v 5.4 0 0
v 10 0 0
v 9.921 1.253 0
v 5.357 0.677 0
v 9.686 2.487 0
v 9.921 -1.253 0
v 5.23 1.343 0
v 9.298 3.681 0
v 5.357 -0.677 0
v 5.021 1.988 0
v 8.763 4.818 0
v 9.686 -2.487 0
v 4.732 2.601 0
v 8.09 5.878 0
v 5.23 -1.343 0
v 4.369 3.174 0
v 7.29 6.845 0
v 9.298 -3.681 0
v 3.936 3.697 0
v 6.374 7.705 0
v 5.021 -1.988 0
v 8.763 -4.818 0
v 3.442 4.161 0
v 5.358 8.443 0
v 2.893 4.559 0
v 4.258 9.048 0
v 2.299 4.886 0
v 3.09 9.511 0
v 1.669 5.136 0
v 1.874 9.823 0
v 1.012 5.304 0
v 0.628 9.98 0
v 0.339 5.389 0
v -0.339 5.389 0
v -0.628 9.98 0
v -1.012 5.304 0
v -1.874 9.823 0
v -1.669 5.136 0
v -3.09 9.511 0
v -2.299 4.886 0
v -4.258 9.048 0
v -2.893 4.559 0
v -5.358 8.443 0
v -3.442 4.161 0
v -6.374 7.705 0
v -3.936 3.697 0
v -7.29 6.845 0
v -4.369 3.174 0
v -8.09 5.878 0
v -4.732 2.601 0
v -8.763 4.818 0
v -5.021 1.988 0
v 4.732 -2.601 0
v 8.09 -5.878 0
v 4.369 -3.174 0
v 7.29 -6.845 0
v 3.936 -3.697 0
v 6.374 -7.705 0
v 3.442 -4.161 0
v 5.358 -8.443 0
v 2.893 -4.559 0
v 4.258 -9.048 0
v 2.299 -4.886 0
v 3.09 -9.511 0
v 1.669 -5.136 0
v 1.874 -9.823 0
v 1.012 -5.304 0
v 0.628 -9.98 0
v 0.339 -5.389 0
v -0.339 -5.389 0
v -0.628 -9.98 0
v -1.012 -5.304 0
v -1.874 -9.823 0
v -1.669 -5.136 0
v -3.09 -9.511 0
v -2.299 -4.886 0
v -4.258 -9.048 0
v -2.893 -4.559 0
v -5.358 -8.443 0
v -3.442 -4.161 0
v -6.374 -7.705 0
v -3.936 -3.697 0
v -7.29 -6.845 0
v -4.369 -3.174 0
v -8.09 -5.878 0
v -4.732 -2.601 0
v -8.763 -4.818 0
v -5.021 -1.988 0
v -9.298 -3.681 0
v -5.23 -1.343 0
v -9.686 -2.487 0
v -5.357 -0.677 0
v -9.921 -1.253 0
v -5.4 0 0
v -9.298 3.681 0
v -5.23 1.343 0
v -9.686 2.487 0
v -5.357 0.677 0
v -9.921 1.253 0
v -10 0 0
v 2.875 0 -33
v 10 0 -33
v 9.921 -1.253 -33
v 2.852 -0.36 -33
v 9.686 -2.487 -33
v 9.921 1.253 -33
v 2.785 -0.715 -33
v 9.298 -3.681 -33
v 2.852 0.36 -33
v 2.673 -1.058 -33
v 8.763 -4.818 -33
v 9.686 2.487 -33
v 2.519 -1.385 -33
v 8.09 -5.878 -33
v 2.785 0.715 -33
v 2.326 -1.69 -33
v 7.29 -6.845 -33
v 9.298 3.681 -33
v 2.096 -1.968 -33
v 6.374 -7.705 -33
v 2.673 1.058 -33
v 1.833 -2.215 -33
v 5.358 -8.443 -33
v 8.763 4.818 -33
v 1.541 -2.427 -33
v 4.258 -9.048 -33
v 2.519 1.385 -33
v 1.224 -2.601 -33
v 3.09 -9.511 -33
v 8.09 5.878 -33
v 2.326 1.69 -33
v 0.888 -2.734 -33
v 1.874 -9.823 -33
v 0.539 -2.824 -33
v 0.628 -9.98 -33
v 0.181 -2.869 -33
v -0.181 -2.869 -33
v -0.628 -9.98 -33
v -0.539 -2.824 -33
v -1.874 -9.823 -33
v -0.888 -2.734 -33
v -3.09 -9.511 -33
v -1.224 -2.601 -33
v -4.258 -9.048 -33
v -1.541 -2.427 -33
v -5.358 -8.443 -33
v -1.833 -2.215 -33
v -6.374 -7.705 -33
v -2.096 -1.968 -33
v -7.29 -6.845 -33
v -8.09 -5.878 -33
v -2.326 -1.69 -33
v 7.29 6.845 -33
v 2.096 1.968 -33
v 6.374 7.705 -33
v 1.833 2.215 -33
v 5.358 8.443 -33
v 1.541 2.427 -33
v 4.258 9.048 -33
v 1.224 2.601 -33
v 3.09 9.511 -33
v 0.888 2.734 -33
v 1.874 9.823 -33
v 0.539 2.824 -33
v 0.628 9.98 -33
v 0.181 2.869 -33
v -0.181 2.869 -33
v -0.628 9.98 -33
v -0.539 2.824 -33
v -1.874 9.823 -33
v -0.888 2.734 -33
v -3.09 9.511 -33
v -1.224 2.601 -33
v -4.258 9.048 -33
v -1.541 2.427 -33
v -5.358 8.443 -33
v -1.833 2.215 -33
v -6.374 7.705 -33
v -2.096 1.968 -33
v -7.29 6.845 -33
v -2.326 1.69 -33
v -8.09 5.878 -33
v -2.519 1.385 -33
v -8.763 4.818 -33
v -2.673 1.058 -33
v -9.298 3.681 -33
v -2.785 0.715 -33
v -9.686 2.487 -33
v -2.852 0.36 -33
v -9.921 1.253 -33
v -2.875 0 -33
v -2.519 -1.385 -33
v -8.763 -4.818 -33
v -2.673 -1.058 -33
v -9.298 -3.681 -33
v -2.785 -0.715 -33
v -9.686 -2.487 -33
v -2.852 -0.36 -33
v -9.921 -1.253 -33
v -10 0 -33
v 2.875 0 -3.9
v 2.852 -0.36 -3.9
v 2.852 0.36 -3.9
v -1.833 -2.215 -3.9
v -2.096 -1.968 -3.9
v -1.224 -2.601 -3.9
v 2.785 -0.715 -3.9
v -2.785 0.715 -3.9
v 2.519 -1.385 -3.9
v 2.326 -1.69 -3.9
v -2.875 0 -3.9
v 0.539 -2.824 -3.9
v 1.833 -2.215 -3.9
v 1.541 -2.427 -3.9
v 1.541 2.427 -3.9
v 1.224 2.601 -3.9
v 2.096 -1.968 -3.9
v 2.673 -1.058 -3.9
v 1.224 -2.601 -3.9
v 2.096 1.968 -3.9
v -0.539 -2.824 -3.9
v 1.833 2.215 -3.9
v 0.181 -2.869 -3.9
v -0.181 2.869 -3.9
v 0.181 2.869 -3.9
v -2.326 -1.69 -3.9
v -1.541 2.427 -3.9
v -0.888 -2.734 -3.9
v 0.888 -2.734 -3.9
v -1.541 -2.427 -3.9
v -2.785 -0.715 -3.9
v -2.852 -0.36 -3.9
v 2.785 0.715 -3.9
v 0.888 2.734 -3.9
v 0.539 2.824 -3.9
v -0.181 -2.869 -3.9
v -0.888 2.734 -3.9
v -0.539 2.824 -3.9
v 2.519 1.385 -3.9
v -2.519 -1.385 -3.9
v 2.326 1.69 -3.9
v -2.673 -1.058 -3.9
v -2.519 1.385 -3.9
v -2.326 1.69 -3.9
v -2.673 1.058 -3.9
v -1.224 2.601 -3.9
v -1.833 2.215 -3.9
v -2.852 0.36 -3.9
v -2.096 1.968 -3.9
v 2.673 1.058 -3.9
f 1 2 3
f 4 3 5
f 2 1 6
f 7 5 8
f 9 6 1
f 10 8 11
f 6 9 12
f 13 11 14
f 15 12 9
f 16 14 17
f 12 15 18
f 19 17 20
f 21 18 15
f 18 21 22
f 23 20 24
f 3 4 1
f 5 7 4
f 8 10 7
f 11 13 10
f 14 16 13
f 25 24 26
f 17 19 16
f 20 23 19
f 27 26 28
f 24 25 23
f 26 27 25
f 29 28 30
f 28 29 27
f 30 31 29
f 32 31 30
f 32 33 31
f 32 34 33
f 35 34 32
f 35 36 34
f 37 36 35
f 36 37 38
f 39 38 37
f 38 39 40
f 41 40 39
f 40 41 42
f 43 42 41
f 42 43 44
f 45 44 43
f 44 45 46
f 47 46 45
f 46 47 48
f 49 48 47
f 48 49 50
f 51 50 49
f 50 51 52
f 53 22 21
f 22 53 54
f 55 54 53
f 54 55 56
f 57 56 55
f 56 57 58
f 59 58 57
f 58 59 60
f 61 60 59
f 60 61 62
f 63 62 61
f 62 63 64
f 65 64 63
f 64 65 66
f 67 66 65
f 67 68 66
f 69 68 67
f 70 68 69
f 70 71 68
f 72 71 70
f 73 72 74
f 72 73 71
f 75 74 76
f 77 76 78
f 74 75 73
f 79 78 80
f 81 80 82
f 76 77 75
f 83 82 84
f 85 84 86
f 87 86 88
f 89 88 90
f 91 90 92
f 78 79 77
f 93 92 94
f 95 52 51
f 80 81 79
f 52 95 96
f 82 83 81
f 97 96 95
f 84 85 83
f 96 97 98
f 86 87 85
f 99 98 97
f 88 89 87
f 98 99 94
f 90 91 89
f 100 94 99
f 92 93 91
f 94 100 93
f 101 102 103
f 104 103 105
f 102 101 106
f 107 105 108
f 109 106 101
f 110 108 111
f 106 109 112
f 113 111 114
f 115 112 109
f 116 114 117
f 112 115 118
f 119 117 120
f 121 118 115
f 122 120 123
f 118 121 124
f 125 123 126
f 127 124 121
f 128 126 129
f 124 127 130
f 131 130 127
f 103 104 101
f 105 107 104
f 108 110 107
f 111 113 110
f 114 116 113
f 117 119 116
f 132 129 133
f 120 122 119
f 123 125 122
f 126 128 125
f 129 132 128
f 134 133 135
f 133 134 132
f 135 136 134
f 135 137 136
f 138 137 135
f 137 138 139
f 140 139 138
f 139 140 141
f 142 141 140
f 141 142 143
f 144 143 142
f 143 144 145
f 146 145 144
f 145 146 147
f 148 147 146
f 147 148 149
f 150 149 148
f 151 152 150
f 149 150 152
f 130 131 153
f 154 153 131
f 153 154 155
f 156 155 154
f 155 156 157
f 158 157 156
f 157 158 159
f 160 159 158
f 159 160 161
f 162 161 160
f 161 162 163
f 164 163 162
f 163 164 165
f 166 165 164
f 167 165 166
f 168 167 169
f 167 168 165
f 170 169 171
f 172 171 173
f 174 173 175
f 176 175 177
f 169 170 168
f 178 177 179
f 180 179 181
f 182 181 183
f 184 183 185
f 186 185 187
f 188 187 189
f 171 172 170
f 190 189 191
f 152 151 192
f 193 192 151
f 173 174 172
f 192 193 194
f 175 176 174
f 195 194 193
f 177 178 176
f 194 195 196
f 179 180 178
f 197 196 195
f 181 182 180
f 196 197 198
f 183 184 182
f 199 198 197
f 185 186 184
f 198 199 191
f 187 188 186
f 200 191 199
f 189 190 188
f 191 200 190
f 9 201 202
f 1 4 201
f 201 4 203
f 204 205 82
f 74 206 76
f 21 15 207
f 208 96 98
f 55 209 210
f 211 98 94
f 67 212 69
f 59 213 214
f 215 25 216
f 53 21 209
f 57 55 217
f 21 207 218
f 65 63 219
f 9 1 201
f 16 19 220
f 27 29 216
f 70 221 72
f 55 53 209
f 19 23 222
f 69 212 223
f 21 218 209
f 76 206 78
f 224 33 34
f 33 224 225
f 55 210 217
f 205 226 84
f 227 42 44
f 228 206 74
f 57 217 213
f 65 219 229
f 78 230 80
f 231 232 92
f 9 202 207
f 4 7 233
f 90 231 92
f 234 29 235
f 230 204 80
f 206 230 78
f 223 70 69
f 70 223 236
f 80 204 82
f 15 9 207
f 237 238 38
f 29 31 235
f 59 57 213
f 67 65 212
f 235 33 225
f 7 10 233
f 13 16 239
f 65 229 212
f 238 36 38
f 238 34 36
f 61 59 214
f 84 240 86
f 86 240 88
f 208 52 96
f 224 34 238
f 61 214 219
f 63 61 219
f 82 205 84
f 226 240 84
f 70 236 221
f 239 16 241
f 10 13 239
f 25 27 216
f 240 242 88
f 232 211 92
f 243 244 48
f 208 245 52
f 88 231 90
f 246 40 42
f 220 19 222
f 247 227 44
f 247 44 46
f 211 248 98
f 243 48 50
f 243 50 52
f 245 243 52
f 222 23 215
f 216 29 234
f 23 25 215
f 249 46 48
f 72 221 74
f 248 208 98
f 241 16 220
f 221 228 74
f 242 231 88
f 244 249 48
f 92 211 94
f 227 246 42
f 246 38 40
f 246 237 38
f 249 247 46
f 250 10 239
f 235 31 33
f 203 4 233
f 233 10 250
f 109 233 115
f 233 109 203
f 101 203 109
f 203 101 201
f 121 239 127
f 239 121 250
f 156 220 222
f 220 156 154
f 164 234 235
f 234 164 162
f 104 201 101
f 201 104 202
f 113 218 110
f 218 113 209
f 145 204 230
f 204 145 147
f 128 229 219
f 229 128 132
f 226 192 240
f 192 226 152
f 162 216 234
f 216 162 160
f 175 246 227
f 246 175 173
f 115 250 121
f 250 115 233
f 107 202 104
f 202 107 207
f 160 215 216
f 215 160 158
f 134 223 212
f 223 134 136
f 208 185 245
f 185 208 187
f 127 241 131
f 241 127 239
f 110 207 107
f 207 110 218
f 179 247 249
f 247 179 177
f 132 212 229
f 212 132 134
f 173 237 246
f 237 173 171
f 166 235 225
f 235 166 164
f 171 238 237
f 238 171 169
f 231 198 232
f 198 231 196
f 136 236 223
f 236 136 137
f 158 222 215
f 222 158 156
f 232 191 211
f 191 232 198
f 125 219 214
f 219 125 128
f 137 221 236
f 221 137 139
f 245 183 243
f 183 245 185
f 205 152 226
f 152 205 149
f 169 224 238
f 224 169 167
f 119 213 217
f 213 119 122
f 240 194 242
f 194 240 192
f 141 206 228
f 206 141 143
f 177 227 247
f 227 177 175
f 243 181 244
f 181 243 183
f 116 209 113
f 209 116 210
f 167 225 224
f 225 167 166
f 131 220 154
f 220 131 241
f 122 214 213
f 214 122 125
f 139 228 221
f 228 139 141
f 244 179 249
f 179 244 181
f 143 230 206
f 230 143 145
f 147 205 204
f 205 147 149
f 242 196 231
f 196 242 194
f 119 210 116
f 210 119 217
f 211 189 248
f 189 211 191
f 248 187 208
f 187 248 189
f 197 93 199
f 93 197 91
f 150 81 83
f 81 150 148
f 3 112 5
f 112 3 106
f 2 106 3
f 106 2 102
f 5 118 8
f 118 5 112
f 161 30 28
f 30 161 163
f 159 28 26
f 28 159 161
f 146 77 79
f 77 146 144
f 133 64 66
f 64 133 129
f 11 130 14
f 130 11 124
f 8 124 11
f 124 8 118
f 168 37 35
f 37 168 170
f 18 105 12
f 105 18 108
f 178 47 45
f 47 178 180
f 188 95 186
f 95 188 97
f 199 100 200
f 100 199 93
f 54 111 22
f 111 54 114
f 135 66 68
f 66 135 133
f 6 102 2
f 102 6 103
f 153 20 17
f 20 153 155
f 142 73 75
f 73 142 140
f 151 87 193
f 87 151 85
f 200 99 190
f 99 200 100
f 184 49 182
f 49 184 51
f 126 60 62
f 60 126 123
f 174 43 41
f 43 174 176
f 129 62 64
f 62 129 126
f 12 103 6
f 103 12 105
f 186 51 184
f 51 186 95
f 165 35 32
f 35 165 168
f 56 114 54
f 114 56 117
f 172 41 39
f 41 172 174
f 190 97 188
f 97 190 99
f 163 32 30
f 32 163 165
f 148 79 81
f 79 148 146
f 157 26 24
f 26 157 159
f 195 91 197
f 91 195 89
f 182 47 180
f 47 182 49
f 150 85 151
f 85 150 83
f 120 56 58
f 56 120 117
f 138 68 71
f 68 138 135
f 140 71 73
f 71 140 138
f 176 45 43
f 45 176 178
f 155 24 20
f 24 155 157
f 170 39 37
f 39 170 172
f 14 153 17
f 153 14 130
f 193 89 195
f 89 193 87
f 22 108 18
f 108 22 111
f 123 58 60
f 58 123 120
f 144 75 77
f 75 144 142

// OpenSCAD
$fn = 50;


difference() {
	union() {
		translate(v = [0, 0, -33.0000000000]) {
			cylinder(h = 33, r = 10.0000000000);
		}
		cylinder(h = 0, r = 13.0000000000);
	}
	union() {
		translate(v = [0, 0, 0]) {
			rotate(a = [0, 0, 0]) {
				difference() {
					union() {
						#translate(v = [0, 0, -33.0000000000]) {
							cylinder(h = 33, r = 2.6000000000);
						}
						#translate(v = [0, 0, -3.9000000000]) {
							cylinder(h = 3.9000000000, r1 = 2.8750000000, r2 = 5.4000000000);
						}
						#translate(v = [0, 0, -33.0000000000]) {
							cylinder(h = 33, r = 2.8750000000);
						}
						#translate(v = [0, 0, -33.0000000000]) {
							cylinder(h = 33, r = 2.6000000000);
						}
					}
					union();
				}
			}
		}
	}
}
